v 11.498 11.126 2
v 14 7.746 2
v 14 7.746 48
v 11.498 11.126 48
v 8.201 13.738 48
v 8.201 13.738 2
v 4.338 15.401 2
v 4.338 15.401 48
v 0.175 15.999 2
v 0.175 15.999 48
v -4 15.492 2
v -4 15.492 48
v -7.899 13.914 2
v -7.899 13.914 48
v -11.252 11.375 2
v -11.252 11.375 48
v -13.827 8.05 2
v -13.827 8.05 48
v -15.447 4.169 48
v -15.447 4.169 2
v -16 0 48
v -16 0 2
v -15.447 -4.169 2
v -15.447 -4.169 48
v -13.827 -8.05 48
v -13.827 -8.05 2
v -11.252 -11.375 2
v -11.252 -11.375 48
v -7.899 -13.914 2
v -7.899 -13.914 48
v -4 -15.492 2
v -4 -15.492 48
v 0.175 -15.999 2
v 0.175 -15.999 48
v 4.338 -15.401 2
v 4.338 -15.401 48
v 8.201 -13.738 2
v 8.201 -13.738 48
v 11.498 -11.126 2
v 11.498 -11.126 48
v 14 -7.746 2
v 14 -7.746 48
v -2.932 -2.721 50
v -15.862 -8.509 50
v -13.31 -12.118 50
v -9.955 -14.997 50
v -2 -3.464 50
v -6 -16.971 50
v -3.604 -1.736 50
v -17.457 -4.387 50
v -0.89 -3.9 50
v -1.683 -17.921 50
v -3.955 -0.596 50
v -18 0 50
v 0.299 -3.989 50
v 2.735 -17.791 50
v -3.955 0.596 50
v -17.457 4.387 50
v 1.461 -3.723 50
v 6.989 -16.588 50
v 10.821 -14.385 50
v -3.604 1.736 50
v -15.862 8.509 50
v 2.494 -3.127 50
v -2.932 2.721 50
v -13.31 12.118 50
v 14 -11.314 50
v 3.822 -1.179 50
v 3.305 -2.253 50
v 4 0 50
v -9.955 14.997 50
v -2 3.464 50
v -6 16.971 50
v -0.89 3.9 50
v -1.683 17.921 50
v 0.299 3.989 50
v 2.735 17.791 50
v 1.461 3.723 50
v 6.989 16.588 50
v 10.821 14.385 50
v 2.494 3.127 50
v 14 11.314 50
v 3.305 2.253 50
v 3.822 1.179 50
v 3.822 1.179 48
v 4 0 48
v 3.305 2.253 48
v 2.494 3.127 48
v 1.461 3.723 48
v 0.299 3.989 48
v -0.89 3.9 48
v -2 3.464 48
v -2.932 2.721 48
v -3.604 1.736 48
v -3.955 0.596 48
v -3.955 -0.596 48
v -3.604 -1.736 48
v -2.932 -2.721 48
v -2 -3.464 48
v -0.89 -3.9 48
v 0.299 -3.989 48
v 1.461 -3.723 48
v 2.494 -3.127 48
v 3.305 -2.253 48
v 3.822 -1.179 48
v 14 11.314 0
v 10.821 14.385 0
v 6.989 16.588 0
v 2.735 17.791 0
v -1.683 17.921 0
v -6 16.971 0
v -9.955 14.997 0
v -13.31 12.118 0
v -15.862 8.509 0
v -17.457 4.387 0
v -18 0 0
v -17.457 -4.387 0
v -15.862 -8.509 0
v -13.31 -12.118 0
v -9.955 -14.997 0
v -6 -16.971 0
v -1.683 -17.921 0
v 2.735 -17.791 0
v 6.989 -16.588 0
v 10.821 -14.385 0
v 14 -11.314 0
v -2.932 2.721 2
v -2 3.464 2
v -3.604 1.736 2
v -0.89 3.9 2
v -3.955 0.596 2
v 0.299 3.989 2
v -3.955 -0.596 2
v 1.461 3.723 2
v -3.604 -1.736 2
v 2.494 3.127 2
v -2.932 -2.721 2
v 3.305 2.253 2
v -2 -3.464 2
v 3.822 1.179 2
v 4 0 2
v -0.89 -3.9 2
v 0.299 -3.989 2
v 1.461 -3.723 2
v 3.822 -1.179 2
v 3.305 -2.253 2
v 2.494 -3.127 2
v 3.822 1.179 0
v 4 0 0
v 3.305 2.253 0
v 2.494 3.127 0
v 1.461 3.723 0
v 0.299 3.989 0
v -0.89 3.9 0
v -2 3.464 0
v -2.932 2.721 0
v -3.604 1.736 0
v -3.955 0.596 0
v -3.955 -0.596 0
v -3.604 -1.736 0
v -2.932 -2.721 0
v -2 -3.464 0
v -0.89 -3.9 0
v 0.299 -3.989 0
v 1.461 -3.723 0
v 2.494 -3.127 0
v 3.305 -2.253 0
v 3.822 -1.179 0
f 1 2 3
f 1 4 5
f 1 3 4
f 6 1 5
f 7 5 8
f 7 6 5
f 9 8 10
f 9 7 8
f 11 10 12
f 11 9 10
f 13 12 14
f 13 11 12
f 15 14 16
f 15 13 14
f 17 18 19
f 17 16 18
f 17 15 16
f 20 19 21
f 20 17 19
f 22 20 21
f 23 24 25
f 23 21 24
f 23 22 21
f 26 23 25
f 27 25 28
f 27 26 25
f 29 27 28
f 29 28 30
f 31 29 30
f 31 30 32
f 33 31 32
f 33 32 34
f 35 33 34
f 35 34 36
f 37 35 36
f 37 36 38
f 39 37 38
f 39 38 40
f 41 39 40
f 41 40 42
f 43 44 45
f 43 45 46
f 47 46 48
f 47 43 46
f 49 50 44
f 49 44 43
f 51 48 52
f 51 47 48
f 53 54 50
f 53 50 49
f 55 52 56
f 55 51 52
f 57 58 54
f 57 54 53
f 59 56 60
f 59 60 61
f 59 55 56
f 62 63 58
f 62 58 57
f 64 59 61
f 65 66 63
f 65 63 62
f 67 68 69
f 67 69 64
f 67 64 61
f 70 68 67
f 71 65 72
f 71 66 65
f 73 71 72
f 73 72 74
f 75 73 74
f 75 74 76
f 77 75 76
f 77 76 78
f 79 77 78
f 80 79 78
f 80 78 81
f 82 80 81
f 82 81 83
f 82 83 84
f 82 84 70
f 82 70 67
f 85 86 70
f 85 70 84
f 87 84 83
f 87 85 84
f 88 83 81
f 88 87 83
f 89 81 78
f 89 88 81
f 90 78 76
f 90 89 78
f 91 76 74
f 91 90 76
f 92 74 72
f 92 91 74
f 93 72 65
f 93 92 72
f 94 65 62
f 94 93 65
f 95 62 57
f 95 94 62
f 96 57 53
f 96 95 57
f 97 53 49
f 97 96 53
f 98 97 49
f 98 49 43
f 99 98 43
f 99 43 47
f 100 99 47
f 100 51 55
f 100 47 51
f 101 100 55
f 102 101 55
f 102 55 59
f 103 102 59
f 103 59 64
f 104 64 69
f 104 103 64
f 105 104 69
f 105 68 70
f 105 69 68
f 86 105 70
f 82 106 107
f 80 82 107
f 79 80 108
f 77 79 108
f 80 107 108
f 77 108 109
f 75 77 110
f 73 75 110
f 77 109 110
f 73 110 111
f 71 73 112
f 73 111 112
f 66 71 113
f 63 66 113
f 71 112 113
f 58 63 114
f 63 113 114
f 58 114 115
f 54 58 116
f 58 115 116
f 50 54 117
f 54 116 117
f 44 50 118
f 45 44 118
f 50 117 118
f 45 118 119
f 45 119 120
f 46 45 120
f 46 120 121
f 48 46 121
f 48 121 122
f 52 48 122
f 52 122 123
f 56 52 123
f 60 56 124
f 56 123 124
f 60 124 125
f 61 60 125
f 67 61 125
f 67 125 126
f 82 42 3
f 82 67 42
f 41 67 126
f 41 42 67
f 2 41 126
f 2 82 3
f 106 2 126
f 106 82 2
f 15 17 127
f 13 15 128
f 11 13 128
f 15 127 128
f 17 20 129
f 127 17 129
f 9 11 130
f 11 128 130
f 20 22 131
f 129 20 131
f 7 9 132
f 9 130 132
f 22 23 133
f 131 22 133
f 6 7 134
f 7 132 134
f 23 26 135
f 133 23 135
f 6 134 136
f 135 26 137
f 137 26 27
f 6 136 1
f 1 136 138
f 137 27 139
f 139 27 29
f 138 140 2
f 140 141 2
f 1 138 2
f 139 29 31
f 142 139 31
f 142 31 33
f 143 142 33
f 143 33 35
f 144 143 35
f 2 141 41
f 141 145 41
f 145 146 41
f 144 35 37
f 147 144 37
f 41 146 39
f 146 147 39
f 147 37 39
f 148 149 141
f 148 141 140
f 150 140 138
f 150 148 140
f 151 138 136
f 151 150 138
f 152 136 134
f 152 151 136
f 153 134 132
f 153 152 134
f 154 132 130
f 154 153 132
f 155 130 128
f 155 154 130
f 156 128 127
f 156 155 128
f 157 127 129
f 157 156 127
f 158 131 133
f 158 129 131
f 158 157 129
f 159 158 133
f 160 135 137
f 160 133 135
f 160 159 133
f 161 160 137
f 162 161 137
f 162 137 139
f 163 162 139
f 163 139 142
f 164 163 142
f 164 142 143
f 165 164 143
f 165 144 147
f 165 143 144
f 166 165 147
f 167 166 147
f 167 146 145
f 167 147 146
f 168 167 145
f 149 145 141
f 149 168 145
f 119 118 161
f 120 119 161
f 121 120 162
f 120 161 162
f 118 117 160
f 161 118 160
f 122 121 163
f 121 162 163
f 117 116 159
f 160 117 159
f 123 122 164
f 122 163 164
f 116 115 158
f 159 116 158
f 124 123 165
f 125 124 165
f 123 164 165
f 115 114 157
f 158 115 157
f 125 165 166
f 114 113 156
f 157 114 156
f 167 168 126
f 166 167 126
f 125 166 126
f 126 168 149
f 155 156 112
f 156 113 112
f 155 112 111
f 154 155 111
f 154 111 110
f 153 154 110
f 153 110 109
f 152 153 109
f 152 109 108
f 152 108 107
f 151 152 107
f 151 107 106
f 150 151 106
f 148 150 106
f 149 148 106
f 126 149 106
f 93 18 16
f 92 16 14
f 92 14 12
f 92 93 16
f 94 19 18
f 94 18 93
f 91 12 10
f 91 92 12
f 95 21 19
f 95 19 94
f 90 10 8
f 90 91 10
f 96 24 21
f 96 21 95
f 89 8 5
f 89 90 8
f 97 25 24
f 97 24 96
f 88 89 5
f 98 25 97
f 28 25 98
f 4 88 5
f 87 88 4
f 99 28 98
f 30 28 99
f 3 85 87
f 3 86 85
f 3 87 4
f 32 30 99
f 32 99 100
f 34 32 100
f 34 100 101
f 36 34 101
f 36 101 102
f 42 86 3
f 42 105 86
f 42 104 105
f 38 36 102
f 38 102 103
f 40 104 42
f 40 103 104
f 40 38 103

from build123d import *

# Parameters (mm, degrees)
SKETCH1_R               = 18
SKETCH1_R_2             = 16
BOSS_EXTRUDE1_DEPTH     = 50
SKETCH3_R               = 18
BOSS_EXTRUDE2_DEPTH     = 2
BOSS_EXTRUDE3_START     = -48
SKETCH3_2_R             = 18
BOSS_EXTRUDE3_DEPTH     = 2
CUT_EXTRUDE1_START      = 14
SKETCH2_W               = 50
SKETCH2_H               = 36
CUT_EXTRUDE1_DEPTH      = 150
CUT_EXTRUDE2_DEPTH      = 57.107040556
CUT_EXTRUDE2_DEPTH_BACK = 57.107040556
SKETCH4_R               = 4


with BuildPart() as part:
    # Sketch1 → Boss-Extrude1 (new body)
    with BuildSketch(Plane.XY):
        Circle(SKETCH1_R)
        Circle(SKETCH1_R_2, mode=Mode.SUBTRACT)
    extrude(amount=BOSS_EXTRUDE1_DEPTH)

    # Sketch3 → Boss-Extrude2 (add)
    with BuildSketch(Plane(origin=(0, 0, 0), x_dir=(-1, 0, 0), z_dir=(0, 0, -1))):
        with Locations(Location((0, 0, 0), (0, 0, 180))):
            Circle(SKETCH3_R)
    extrude(amount=-BOSS_EXTRUDE2_DEPTH)

    # Sketch3<2> → Boss-Extrude3 (add)
    with BuildSketch(Plane(origin=(0, 0, 0), x_dir=(-1, 0, 0), z_dir=(0, 0, -1)).offset(BOSS_EXTRUDE3_START)):
        with Locations(Location((0, 0, 0), (0, 0, 180))):
            Circle(SKETCH3_2_R)
    extrude(amount=-BOSS_EXTRUDE3_DEPTH)

    # Sketch2 → Cut-Extrude1 (cut)
    with BuildSketch(Plane(origin=(0, 0, 0), x_dir=(0, 0, -1), z_dir=(1, 0, 0)).offset(CUT_EXTRUDE1_START)):
        with Locations((-25, 0)):
            Rectangle(SKETCH2_W, SKETCH2_H)
    extrude(amount=CUT_EXTRUDE1_DEPTH, mode=Mode.SUBTRACT)

    # Sketch4 → Cut-Extrude2 (cut, two sides: drawn at the far end of the back side and taken through both)
    with BuildSketch(Plane.XY.offset(50).offset(-CUT_EXTRUDE2_DEPTH_BACK)):
        Circle(SKETCH4_R)
    extrude(amount=CUT_EXTRUDE2_DEPTH + CUT_EXTRUDE2_DEPTH_BACK, mode=Mode.SUBTRACT)


solid = part.part
